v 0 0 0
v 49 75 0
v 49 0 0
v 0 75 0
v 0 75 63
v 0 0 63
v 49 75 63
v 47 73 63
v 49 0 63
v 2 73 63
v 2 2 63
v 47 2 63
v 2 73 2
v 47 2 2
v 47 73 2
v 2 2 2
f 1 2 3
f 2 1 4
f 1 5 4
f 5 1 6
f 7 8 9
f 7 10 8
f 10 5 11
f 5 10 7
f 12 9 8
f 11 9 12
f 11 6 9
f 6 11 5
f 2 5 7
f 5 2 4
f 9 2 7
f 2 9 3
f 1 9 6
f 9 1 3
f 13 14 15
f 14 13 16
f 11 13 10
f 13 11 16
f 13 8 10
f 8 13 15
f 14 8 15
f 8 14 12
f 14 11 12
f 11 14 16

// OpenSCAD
cardBoxSlotWidth = 45;
cardBoxSlotHeight = 71;
cardBoxSlot = [cardBoxSlotWidth, cardBoxSlotHeight];

wallOffset = 4;

cardBoxWidth = cardBoxSlotWidth + wallOffset;
cardBoxHeight = cardBoxSlotHeight + wallOffset;
cardBox = [cardBoxWidth, cardBoxHeight];

cardBoxZRatio = 1;
cardBoxZ = (67 - wallOffset) / cardBoxZRatio;

difference() {
  linear_extrude(cardBoxZ)
    square(size=cardBox);

  translate(v=[wallOffset / 2, wallOffset / 2, wallOffset / 2])
    linear_extrude(cardBoxZ)
      square(size=cardBoxSlot);
}
